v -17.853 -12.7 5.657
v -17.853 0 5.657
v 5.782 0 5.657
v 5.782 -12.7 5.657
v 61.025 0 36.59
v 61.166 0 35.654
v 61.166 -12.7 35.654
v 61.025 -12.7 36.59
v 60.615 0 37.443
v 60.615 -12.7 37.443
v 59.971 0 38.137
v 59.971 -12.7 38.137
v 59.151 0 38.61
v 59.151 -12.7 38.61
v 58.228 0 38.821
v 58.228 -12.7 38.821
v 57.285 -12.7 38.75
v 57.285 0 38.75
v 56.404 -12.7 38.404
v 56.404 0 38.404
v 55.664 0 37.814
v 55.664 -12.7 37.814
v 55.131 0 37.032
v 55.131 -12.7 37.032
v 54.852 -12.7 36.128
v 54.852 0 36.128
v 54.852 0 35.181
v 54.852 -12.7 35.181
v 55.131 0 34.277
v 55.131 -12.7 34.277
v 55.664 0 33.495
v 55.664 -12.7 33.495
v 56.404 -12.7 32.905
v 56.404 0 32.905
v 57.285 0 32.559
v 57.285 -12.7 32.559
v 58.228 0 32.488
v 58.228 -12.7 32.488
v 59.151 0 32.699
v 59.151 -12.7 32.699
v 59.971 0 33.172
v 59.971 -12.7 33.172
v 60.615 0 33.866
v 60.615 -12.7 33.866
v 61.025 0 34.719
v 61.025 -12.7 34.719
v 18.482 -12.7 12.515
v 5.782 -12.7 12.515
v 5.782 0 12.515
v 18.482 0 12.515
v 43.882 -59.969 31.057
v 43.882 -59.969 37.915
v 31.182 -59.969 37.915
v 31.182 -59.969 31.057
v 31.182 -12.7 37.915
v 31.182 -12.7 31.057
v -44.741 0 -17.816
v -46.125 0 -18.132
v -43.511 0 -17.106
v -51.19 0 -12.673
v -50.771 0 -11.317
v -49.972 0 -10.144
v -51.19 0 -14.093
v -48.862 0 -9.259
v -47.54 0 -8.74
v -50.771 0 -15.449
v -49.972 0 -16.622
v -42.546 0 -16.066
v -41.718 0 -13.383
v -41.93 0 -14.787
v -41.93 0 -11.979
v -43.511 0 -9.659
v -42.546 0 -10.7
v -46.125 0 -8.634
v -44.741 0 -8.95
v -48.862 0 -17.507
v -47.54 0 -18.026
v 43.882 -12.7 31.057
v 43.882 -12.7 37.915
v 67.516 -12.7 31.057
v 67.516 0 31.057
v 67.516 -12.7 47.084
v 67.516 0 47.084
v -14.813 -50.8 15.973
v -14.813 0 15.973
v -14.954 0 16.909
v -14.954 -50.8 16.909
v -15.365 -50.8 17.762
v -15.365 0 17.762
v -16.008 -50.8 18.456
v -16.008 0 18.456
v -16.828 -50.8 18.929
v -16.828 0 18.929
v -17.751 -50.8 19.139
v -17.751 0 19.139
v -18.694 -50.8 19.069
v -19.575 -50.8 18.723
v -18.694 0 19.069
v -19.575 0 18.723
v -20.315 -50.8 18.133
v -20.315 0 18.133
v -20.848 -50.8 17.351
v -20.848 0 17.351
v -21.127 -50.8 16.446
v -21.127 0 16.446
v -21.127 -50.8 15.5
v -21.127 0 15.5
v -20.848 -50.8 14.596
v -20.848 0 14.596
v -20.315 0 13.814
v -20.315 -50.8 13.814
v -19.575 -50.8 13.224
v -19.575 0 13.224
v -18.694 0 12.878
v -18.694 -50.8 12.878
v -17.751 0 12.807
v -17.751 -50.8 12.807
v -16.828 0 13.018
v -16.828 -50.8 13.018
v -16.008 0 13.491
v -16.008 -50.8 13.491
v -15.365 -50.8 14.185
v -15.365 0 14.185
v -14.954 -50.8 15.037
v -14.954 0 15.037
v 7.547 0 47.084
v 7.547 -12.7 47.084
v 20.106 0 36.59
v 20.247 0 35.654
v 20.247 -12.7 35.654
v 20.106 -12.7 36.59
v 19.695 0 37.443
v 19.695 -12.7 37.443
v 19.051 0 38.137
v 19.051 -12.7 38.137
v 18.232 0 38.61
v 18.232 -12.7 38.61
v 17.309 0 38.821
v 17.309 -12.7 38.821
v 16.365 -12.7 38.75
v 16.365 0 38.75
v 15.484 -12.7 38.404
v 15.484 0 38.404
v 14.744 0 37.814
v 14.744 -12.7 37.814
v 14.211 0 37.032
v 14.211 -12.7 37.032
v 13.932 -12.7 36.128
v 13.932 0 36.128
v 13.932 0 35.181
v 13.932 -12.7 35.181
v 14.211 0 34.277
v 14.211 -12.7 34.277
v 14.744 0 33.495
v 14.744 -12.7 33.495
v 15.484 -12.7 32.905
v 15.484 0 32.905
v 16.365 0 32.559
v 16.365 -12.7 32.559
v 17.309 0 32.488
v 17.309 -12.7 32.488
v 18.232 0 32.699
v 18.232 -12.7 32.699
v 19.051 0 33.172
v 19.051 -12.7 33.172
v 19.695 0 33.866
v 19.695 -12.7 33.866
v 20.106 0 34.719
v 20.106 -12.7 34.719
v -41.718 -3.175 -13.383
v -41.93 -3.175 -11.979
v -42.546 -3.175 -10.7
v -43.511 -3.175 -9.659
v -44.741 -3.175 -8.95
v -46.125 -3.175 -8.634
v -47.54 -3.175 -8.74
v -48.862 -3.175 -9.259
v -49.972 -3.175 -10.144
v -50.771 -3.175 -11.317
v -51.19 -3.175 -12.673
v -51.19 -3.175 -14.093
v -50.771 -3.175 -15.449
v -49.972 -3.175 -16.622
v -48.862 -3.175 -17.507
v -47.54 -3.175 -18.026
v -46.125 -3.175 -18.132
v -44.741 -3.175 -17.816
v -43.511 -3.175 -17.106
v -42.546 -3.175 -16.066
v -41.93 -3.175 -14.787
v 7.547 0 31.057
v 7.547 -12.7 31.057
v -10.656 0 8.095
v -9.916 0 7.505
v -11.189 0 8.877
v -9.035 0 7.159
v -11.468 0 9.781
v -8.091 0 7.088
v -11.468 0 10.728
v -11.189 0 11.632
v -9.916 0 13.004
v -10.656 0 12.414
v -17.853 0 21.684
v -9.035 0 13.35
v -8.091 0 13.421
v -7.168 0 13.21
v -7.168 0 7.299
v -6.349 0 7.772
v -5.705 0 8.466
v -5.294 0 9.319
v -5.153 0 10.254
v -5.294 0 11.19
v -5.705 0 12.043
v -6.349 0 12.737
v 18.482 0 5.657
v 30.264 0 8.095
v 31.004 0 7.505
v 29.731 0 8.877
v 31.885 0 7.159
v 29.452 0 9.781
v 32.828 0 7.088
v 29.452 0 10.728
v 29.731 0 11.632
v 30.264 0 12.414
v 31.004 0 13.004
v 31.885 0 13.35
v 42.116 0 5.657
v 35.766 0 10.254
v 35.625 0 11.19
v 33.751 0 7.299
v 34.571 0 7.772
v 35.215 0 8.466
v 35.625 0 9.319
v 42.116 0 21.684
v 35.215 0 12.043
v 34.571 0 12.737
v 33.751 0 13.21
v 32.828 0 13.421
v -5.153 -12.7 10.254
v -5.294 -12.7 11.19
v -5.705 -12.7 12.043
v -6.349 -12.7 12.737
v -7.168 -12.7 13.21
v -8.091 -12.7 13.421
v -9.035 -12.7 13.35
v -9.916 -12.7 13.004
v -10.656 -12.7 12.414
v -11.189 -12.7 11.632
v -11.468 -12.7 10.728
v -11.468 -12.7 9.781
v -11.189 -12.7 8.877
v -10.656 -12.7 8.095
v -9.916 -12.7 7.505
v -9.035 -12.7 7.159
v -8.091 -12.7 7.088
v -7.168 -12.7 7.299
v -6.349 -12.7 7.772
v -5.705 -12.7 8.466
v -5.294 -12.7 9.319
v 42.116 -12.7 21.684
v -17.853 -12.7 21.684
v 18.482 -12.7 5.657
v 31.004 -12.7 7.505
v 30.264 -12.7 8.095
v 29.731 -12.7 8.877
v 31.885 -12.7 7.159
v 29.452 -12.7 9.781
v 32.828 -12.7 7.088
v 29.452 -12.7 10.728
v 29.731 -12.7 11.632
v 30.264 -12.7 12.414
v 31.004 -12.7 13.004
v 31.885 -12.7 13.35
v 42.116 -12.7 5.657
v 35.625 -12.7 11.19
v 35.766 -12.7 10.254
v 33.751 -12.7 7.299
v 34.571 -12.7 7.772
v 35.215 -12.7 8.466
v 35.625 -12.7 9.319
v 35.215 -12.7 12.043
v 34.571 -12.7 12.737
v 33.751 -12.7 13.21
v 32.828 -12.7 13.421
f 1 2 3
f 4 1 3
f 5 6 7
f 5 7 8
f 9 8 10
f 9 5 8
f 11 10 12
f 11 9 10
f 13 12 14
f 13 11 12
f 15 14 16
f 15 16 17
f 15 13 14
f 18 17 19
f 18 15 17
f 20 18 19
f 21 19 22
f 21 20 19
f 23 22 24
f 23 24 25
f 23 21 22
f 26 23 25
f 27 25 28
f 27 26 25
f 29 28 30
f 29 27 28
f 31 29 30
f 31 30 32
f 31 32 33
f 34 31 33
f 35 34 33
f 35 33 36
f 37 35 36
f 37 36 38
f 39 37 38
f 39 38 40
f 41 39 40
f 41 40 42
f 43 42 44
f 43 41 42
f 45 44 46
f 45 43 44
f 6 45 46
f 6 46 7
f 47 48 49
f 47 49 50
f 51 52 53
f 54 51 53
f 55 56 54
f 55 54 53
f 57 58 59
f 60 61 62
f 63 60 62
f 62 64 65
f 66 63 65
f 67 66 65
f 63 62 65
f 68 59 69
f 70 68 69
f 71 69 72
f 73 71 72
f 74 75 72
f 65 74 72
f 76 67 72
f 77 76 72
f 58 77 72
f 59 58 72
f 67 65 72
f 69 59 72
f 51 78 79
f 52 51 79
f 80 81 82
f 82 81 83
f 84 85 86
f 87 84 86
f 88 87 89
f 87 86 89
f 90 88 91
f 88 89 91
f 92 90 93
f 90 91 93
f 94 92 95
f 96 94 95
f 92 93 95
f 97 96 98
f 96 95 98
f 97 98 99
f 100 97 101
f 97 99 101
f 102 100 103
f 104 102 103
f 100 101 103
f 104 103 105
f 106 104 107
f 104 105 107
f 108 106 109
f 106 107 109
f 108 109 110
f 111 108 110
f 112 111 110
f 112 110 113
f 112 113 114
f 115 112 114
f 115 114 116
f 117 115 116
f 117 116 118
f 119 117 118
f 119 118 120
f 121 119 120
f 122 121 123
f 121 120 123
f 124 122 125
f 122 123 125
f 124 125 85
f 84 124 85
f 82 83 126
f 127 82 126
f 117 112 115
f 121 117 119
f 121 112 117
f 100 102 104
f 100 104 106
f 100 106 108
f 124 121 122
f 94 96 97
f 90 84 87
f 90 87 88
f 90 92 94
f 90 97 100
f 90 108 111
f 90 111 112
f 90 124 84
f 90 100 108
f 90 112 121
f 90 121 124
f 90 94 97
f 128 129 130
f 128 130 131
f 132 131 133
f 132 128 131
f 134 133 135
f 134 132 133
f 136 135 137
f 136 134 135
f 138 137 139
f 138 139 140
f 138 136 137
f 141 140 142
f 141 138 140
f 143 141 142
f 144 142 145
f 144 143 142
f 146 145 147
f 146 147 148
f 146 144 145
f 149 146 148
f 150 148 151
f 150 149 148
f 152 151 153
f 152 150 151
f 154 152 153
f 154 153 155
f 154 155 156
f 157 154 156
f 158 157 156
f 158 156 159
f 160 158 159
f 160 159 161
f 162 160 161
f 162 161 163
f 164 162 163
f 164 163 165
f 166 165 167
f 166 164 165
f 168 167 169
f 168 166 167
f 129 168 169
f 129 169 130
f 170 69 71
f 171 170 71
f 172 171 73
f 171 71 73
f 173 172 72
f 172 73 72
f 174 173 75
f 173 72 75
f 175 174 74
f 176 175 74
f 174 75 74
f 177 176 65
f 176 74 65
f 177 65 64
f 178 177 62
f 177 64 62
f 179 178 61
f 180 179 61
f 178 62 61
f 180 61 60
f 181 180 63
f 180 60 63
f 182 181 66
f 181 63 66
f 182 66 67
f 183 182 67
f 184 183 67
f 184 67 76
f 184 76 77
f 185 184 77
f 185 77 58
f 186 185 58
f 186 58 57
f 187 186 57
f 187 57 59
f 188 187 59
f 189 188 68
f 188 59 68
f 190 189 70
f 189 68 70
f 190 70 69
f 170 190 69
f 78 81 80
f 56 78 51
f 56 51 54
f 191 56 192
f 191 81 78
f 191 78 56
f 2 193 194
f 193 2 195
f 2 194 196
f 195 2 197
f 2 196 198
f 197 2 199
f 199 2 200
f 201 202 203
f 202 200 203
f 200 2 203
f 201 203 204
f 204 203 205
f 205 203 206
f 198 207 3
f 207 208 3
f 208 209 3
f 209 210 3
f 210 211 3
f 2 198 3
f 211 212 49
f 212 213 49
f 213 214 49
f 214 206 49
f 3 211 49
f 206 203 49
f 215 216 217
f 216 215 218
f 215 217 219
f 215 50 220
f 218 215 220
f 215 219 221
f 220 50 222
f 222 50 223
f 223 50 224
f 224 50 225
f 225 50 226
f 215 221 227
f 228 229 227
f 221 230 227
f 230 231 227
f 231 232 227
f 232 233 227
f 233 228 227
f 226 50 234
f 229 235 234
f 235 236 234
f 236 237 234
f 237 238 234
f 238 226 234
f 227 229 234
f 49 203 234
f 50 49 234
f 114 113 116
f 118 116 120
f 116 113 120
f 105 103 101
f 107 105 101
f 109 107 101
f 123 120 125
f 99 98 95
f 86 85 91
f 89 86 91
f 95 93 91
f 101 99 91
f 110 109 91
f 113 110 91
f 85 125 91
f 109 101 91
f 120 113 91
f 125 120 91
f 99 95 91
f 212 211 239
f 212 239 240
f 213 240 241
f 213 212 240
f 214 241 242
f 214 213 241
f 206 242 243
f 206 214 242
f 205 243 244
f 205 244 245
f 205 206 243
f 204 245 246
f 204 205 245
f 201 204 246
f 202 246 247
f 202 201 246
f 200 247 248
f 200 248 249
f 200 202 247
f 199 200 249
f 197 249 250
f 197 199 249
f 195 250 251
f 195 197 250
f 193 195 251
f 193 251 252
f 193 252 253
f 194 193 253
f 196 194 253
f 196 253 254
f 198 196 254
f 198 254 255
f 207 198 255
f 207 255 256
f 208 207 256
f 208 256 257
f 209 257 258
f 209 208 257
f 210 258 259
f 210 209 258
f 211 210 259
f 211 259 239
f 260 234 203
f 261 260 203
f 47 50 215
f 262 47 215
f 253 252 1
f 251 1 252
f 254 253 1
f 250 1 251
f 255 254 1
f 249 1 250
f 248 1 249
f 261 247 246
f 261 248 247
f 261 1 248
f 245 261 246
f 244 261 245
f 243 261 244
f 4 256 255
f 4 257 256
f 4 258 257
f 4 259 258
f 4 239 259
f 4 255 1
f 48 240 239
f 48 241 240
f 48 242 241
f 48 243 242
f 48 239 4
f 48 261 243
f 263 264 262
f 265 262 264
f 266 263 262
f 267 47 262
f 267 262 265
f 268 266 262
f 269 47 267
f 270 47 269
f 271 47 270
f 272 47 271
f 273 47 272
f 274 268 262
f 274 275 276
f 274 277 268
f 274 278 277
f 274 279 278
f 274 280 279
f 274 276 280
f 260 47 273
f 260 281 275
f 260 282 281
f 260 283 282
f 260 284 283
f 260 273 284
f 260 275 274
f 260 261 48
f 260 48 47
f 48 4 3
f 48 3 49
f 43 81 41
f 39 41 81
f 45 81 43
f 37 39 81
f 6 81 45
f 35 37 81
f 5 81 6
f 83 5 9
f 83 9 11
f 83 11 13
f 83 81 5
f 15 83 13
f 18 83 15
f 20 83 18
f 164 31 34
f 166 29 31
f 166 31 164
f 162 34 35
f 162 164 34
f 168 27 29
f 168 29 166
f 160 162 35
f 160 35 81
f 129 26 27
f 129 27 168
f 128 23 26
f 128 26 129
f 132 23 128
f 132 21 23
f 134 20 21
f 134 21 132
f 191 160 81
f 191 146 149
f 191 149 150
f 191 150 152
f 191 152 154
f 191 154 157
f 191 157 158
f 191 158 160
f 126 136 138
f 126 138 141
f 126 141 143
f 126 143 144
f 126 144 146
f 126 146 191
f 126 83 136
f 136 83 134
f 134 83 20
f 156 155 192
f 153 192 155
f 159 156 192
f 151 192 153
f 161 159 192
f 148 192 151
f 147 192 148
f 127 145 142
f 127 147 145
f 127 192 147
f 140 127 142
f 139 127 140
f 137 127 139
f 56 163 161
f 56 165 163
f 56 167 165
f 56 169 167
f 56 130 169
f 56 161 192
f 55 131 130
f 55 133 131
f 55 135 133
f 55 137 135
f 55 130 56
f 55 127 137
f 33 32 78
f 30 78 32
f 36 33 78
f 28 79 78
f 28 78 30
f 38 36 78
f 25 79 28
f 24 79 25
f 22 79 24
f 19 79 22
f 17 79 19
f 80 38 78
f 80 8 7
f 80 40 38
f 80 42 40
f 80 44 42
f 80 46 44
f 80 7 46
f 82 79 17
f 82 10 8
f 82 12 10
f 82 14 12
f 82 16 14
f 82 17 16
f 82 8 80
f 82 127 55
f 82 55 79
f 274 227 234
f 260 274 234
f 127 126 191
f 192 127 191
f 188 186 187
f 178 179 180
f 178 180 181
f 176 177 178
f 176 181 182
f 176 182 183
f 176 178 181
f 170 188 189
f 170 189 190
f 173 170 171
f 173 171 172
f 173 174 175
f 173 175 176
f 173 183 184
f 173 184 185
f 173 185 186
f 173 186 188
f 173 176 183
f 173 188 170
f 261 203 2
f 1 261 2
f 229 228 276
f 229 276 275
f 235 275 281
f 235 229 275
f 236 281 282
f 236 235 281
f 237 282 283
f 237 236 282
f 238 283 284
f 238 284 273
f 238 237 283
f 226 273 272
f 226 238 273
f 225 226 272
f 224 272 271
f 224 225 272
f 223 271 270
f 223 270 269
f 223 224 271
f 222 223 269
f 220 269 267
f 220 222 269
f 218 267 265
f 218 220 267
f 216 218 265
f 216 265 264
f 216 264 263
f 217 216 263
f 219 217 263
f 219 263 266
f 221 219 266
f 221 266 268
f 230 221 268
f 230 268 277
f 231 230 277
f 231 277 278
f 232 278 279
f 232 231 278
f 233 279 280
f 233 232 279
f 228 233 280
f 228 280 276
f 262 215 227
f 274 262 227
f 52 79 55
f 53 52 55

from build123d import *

# Parameters (mm, degrees)
F0_R     = 3.175
F1_DEPTH = 12.7
F3_W     = 12.7
F3_H     = 6.858
F4_DEPTH = 59.9694
F6_R     = 3.175
F7_DEPTH = 50.8
F8_R     = 4.7625
F9_DEPTH = 3.175


# Not quite as in the source:
# - a feature of the source that left no trace in its solid (it failed there, or was rolled back) is left out


with BuildPart() as f1:
    # F0 (on Front) → F1 (new body)
    with BuildSketch(Plane.XZ):
        Polygon((42.1162071086, 21.6844746424), (-17.8531928914, 21.6844746424), (-17.8531928914, 5.6570746424), (5.7815071086, 5.6570746424), (5.7815071086, 12.5150746424), (18.4815071086, 12.5150746424), (18.4815071086, 5.6570746424), (42.1162071086, 5.6570746424), align=None)
        with Locations((-8.3281928914, 10.2544746424)):
            Circle(F0_R, mode=Mode.SUBTRACT)
        with Locations((32.5912071086, 10.2544746424)):
            Circle(F0_R, mode=Mode.SUBTRACT)
    extrude(amount=F1_DEPTH)


with BuildPart() as f2_1:
    # F2: copy of F1
    add(f1.part.moved(Location((25.4, 0, 25.4))))

    # F3 (on face) → F4 (join)
    with BuildSketch(Plane(origin=(0, 0, 0), x_dir=(-1, 0, 0), z_dir=(0, 1, 0))):
        with Locations((-37.5315071086, 34.4860746424)):
            Rectangle(F3_W, F3_H)
    extrude(amount=-F4_DEPTH)


with BuildPart() as f7:
    # F6 (on Front) → F7 (new body)
    with BuildSketch(Plane.XZ):
        with Locations((-17.9878603667, 15.973219648)):
            Circle(F6_R)
    extrude(amount=F7_DEPTH)


with BuildPart() as f9:
    # F8 (on Front) → F9 (new body)
    with BuildSketch(Plane.XZ):
        with Locations((-46.4806295931, -13.3829684928)):
            Circle(F8_R)
    extrude(amount=F9_DEPTH)


solid = Compound([f1.part, f2_1.part, f7.part, f9.part])
